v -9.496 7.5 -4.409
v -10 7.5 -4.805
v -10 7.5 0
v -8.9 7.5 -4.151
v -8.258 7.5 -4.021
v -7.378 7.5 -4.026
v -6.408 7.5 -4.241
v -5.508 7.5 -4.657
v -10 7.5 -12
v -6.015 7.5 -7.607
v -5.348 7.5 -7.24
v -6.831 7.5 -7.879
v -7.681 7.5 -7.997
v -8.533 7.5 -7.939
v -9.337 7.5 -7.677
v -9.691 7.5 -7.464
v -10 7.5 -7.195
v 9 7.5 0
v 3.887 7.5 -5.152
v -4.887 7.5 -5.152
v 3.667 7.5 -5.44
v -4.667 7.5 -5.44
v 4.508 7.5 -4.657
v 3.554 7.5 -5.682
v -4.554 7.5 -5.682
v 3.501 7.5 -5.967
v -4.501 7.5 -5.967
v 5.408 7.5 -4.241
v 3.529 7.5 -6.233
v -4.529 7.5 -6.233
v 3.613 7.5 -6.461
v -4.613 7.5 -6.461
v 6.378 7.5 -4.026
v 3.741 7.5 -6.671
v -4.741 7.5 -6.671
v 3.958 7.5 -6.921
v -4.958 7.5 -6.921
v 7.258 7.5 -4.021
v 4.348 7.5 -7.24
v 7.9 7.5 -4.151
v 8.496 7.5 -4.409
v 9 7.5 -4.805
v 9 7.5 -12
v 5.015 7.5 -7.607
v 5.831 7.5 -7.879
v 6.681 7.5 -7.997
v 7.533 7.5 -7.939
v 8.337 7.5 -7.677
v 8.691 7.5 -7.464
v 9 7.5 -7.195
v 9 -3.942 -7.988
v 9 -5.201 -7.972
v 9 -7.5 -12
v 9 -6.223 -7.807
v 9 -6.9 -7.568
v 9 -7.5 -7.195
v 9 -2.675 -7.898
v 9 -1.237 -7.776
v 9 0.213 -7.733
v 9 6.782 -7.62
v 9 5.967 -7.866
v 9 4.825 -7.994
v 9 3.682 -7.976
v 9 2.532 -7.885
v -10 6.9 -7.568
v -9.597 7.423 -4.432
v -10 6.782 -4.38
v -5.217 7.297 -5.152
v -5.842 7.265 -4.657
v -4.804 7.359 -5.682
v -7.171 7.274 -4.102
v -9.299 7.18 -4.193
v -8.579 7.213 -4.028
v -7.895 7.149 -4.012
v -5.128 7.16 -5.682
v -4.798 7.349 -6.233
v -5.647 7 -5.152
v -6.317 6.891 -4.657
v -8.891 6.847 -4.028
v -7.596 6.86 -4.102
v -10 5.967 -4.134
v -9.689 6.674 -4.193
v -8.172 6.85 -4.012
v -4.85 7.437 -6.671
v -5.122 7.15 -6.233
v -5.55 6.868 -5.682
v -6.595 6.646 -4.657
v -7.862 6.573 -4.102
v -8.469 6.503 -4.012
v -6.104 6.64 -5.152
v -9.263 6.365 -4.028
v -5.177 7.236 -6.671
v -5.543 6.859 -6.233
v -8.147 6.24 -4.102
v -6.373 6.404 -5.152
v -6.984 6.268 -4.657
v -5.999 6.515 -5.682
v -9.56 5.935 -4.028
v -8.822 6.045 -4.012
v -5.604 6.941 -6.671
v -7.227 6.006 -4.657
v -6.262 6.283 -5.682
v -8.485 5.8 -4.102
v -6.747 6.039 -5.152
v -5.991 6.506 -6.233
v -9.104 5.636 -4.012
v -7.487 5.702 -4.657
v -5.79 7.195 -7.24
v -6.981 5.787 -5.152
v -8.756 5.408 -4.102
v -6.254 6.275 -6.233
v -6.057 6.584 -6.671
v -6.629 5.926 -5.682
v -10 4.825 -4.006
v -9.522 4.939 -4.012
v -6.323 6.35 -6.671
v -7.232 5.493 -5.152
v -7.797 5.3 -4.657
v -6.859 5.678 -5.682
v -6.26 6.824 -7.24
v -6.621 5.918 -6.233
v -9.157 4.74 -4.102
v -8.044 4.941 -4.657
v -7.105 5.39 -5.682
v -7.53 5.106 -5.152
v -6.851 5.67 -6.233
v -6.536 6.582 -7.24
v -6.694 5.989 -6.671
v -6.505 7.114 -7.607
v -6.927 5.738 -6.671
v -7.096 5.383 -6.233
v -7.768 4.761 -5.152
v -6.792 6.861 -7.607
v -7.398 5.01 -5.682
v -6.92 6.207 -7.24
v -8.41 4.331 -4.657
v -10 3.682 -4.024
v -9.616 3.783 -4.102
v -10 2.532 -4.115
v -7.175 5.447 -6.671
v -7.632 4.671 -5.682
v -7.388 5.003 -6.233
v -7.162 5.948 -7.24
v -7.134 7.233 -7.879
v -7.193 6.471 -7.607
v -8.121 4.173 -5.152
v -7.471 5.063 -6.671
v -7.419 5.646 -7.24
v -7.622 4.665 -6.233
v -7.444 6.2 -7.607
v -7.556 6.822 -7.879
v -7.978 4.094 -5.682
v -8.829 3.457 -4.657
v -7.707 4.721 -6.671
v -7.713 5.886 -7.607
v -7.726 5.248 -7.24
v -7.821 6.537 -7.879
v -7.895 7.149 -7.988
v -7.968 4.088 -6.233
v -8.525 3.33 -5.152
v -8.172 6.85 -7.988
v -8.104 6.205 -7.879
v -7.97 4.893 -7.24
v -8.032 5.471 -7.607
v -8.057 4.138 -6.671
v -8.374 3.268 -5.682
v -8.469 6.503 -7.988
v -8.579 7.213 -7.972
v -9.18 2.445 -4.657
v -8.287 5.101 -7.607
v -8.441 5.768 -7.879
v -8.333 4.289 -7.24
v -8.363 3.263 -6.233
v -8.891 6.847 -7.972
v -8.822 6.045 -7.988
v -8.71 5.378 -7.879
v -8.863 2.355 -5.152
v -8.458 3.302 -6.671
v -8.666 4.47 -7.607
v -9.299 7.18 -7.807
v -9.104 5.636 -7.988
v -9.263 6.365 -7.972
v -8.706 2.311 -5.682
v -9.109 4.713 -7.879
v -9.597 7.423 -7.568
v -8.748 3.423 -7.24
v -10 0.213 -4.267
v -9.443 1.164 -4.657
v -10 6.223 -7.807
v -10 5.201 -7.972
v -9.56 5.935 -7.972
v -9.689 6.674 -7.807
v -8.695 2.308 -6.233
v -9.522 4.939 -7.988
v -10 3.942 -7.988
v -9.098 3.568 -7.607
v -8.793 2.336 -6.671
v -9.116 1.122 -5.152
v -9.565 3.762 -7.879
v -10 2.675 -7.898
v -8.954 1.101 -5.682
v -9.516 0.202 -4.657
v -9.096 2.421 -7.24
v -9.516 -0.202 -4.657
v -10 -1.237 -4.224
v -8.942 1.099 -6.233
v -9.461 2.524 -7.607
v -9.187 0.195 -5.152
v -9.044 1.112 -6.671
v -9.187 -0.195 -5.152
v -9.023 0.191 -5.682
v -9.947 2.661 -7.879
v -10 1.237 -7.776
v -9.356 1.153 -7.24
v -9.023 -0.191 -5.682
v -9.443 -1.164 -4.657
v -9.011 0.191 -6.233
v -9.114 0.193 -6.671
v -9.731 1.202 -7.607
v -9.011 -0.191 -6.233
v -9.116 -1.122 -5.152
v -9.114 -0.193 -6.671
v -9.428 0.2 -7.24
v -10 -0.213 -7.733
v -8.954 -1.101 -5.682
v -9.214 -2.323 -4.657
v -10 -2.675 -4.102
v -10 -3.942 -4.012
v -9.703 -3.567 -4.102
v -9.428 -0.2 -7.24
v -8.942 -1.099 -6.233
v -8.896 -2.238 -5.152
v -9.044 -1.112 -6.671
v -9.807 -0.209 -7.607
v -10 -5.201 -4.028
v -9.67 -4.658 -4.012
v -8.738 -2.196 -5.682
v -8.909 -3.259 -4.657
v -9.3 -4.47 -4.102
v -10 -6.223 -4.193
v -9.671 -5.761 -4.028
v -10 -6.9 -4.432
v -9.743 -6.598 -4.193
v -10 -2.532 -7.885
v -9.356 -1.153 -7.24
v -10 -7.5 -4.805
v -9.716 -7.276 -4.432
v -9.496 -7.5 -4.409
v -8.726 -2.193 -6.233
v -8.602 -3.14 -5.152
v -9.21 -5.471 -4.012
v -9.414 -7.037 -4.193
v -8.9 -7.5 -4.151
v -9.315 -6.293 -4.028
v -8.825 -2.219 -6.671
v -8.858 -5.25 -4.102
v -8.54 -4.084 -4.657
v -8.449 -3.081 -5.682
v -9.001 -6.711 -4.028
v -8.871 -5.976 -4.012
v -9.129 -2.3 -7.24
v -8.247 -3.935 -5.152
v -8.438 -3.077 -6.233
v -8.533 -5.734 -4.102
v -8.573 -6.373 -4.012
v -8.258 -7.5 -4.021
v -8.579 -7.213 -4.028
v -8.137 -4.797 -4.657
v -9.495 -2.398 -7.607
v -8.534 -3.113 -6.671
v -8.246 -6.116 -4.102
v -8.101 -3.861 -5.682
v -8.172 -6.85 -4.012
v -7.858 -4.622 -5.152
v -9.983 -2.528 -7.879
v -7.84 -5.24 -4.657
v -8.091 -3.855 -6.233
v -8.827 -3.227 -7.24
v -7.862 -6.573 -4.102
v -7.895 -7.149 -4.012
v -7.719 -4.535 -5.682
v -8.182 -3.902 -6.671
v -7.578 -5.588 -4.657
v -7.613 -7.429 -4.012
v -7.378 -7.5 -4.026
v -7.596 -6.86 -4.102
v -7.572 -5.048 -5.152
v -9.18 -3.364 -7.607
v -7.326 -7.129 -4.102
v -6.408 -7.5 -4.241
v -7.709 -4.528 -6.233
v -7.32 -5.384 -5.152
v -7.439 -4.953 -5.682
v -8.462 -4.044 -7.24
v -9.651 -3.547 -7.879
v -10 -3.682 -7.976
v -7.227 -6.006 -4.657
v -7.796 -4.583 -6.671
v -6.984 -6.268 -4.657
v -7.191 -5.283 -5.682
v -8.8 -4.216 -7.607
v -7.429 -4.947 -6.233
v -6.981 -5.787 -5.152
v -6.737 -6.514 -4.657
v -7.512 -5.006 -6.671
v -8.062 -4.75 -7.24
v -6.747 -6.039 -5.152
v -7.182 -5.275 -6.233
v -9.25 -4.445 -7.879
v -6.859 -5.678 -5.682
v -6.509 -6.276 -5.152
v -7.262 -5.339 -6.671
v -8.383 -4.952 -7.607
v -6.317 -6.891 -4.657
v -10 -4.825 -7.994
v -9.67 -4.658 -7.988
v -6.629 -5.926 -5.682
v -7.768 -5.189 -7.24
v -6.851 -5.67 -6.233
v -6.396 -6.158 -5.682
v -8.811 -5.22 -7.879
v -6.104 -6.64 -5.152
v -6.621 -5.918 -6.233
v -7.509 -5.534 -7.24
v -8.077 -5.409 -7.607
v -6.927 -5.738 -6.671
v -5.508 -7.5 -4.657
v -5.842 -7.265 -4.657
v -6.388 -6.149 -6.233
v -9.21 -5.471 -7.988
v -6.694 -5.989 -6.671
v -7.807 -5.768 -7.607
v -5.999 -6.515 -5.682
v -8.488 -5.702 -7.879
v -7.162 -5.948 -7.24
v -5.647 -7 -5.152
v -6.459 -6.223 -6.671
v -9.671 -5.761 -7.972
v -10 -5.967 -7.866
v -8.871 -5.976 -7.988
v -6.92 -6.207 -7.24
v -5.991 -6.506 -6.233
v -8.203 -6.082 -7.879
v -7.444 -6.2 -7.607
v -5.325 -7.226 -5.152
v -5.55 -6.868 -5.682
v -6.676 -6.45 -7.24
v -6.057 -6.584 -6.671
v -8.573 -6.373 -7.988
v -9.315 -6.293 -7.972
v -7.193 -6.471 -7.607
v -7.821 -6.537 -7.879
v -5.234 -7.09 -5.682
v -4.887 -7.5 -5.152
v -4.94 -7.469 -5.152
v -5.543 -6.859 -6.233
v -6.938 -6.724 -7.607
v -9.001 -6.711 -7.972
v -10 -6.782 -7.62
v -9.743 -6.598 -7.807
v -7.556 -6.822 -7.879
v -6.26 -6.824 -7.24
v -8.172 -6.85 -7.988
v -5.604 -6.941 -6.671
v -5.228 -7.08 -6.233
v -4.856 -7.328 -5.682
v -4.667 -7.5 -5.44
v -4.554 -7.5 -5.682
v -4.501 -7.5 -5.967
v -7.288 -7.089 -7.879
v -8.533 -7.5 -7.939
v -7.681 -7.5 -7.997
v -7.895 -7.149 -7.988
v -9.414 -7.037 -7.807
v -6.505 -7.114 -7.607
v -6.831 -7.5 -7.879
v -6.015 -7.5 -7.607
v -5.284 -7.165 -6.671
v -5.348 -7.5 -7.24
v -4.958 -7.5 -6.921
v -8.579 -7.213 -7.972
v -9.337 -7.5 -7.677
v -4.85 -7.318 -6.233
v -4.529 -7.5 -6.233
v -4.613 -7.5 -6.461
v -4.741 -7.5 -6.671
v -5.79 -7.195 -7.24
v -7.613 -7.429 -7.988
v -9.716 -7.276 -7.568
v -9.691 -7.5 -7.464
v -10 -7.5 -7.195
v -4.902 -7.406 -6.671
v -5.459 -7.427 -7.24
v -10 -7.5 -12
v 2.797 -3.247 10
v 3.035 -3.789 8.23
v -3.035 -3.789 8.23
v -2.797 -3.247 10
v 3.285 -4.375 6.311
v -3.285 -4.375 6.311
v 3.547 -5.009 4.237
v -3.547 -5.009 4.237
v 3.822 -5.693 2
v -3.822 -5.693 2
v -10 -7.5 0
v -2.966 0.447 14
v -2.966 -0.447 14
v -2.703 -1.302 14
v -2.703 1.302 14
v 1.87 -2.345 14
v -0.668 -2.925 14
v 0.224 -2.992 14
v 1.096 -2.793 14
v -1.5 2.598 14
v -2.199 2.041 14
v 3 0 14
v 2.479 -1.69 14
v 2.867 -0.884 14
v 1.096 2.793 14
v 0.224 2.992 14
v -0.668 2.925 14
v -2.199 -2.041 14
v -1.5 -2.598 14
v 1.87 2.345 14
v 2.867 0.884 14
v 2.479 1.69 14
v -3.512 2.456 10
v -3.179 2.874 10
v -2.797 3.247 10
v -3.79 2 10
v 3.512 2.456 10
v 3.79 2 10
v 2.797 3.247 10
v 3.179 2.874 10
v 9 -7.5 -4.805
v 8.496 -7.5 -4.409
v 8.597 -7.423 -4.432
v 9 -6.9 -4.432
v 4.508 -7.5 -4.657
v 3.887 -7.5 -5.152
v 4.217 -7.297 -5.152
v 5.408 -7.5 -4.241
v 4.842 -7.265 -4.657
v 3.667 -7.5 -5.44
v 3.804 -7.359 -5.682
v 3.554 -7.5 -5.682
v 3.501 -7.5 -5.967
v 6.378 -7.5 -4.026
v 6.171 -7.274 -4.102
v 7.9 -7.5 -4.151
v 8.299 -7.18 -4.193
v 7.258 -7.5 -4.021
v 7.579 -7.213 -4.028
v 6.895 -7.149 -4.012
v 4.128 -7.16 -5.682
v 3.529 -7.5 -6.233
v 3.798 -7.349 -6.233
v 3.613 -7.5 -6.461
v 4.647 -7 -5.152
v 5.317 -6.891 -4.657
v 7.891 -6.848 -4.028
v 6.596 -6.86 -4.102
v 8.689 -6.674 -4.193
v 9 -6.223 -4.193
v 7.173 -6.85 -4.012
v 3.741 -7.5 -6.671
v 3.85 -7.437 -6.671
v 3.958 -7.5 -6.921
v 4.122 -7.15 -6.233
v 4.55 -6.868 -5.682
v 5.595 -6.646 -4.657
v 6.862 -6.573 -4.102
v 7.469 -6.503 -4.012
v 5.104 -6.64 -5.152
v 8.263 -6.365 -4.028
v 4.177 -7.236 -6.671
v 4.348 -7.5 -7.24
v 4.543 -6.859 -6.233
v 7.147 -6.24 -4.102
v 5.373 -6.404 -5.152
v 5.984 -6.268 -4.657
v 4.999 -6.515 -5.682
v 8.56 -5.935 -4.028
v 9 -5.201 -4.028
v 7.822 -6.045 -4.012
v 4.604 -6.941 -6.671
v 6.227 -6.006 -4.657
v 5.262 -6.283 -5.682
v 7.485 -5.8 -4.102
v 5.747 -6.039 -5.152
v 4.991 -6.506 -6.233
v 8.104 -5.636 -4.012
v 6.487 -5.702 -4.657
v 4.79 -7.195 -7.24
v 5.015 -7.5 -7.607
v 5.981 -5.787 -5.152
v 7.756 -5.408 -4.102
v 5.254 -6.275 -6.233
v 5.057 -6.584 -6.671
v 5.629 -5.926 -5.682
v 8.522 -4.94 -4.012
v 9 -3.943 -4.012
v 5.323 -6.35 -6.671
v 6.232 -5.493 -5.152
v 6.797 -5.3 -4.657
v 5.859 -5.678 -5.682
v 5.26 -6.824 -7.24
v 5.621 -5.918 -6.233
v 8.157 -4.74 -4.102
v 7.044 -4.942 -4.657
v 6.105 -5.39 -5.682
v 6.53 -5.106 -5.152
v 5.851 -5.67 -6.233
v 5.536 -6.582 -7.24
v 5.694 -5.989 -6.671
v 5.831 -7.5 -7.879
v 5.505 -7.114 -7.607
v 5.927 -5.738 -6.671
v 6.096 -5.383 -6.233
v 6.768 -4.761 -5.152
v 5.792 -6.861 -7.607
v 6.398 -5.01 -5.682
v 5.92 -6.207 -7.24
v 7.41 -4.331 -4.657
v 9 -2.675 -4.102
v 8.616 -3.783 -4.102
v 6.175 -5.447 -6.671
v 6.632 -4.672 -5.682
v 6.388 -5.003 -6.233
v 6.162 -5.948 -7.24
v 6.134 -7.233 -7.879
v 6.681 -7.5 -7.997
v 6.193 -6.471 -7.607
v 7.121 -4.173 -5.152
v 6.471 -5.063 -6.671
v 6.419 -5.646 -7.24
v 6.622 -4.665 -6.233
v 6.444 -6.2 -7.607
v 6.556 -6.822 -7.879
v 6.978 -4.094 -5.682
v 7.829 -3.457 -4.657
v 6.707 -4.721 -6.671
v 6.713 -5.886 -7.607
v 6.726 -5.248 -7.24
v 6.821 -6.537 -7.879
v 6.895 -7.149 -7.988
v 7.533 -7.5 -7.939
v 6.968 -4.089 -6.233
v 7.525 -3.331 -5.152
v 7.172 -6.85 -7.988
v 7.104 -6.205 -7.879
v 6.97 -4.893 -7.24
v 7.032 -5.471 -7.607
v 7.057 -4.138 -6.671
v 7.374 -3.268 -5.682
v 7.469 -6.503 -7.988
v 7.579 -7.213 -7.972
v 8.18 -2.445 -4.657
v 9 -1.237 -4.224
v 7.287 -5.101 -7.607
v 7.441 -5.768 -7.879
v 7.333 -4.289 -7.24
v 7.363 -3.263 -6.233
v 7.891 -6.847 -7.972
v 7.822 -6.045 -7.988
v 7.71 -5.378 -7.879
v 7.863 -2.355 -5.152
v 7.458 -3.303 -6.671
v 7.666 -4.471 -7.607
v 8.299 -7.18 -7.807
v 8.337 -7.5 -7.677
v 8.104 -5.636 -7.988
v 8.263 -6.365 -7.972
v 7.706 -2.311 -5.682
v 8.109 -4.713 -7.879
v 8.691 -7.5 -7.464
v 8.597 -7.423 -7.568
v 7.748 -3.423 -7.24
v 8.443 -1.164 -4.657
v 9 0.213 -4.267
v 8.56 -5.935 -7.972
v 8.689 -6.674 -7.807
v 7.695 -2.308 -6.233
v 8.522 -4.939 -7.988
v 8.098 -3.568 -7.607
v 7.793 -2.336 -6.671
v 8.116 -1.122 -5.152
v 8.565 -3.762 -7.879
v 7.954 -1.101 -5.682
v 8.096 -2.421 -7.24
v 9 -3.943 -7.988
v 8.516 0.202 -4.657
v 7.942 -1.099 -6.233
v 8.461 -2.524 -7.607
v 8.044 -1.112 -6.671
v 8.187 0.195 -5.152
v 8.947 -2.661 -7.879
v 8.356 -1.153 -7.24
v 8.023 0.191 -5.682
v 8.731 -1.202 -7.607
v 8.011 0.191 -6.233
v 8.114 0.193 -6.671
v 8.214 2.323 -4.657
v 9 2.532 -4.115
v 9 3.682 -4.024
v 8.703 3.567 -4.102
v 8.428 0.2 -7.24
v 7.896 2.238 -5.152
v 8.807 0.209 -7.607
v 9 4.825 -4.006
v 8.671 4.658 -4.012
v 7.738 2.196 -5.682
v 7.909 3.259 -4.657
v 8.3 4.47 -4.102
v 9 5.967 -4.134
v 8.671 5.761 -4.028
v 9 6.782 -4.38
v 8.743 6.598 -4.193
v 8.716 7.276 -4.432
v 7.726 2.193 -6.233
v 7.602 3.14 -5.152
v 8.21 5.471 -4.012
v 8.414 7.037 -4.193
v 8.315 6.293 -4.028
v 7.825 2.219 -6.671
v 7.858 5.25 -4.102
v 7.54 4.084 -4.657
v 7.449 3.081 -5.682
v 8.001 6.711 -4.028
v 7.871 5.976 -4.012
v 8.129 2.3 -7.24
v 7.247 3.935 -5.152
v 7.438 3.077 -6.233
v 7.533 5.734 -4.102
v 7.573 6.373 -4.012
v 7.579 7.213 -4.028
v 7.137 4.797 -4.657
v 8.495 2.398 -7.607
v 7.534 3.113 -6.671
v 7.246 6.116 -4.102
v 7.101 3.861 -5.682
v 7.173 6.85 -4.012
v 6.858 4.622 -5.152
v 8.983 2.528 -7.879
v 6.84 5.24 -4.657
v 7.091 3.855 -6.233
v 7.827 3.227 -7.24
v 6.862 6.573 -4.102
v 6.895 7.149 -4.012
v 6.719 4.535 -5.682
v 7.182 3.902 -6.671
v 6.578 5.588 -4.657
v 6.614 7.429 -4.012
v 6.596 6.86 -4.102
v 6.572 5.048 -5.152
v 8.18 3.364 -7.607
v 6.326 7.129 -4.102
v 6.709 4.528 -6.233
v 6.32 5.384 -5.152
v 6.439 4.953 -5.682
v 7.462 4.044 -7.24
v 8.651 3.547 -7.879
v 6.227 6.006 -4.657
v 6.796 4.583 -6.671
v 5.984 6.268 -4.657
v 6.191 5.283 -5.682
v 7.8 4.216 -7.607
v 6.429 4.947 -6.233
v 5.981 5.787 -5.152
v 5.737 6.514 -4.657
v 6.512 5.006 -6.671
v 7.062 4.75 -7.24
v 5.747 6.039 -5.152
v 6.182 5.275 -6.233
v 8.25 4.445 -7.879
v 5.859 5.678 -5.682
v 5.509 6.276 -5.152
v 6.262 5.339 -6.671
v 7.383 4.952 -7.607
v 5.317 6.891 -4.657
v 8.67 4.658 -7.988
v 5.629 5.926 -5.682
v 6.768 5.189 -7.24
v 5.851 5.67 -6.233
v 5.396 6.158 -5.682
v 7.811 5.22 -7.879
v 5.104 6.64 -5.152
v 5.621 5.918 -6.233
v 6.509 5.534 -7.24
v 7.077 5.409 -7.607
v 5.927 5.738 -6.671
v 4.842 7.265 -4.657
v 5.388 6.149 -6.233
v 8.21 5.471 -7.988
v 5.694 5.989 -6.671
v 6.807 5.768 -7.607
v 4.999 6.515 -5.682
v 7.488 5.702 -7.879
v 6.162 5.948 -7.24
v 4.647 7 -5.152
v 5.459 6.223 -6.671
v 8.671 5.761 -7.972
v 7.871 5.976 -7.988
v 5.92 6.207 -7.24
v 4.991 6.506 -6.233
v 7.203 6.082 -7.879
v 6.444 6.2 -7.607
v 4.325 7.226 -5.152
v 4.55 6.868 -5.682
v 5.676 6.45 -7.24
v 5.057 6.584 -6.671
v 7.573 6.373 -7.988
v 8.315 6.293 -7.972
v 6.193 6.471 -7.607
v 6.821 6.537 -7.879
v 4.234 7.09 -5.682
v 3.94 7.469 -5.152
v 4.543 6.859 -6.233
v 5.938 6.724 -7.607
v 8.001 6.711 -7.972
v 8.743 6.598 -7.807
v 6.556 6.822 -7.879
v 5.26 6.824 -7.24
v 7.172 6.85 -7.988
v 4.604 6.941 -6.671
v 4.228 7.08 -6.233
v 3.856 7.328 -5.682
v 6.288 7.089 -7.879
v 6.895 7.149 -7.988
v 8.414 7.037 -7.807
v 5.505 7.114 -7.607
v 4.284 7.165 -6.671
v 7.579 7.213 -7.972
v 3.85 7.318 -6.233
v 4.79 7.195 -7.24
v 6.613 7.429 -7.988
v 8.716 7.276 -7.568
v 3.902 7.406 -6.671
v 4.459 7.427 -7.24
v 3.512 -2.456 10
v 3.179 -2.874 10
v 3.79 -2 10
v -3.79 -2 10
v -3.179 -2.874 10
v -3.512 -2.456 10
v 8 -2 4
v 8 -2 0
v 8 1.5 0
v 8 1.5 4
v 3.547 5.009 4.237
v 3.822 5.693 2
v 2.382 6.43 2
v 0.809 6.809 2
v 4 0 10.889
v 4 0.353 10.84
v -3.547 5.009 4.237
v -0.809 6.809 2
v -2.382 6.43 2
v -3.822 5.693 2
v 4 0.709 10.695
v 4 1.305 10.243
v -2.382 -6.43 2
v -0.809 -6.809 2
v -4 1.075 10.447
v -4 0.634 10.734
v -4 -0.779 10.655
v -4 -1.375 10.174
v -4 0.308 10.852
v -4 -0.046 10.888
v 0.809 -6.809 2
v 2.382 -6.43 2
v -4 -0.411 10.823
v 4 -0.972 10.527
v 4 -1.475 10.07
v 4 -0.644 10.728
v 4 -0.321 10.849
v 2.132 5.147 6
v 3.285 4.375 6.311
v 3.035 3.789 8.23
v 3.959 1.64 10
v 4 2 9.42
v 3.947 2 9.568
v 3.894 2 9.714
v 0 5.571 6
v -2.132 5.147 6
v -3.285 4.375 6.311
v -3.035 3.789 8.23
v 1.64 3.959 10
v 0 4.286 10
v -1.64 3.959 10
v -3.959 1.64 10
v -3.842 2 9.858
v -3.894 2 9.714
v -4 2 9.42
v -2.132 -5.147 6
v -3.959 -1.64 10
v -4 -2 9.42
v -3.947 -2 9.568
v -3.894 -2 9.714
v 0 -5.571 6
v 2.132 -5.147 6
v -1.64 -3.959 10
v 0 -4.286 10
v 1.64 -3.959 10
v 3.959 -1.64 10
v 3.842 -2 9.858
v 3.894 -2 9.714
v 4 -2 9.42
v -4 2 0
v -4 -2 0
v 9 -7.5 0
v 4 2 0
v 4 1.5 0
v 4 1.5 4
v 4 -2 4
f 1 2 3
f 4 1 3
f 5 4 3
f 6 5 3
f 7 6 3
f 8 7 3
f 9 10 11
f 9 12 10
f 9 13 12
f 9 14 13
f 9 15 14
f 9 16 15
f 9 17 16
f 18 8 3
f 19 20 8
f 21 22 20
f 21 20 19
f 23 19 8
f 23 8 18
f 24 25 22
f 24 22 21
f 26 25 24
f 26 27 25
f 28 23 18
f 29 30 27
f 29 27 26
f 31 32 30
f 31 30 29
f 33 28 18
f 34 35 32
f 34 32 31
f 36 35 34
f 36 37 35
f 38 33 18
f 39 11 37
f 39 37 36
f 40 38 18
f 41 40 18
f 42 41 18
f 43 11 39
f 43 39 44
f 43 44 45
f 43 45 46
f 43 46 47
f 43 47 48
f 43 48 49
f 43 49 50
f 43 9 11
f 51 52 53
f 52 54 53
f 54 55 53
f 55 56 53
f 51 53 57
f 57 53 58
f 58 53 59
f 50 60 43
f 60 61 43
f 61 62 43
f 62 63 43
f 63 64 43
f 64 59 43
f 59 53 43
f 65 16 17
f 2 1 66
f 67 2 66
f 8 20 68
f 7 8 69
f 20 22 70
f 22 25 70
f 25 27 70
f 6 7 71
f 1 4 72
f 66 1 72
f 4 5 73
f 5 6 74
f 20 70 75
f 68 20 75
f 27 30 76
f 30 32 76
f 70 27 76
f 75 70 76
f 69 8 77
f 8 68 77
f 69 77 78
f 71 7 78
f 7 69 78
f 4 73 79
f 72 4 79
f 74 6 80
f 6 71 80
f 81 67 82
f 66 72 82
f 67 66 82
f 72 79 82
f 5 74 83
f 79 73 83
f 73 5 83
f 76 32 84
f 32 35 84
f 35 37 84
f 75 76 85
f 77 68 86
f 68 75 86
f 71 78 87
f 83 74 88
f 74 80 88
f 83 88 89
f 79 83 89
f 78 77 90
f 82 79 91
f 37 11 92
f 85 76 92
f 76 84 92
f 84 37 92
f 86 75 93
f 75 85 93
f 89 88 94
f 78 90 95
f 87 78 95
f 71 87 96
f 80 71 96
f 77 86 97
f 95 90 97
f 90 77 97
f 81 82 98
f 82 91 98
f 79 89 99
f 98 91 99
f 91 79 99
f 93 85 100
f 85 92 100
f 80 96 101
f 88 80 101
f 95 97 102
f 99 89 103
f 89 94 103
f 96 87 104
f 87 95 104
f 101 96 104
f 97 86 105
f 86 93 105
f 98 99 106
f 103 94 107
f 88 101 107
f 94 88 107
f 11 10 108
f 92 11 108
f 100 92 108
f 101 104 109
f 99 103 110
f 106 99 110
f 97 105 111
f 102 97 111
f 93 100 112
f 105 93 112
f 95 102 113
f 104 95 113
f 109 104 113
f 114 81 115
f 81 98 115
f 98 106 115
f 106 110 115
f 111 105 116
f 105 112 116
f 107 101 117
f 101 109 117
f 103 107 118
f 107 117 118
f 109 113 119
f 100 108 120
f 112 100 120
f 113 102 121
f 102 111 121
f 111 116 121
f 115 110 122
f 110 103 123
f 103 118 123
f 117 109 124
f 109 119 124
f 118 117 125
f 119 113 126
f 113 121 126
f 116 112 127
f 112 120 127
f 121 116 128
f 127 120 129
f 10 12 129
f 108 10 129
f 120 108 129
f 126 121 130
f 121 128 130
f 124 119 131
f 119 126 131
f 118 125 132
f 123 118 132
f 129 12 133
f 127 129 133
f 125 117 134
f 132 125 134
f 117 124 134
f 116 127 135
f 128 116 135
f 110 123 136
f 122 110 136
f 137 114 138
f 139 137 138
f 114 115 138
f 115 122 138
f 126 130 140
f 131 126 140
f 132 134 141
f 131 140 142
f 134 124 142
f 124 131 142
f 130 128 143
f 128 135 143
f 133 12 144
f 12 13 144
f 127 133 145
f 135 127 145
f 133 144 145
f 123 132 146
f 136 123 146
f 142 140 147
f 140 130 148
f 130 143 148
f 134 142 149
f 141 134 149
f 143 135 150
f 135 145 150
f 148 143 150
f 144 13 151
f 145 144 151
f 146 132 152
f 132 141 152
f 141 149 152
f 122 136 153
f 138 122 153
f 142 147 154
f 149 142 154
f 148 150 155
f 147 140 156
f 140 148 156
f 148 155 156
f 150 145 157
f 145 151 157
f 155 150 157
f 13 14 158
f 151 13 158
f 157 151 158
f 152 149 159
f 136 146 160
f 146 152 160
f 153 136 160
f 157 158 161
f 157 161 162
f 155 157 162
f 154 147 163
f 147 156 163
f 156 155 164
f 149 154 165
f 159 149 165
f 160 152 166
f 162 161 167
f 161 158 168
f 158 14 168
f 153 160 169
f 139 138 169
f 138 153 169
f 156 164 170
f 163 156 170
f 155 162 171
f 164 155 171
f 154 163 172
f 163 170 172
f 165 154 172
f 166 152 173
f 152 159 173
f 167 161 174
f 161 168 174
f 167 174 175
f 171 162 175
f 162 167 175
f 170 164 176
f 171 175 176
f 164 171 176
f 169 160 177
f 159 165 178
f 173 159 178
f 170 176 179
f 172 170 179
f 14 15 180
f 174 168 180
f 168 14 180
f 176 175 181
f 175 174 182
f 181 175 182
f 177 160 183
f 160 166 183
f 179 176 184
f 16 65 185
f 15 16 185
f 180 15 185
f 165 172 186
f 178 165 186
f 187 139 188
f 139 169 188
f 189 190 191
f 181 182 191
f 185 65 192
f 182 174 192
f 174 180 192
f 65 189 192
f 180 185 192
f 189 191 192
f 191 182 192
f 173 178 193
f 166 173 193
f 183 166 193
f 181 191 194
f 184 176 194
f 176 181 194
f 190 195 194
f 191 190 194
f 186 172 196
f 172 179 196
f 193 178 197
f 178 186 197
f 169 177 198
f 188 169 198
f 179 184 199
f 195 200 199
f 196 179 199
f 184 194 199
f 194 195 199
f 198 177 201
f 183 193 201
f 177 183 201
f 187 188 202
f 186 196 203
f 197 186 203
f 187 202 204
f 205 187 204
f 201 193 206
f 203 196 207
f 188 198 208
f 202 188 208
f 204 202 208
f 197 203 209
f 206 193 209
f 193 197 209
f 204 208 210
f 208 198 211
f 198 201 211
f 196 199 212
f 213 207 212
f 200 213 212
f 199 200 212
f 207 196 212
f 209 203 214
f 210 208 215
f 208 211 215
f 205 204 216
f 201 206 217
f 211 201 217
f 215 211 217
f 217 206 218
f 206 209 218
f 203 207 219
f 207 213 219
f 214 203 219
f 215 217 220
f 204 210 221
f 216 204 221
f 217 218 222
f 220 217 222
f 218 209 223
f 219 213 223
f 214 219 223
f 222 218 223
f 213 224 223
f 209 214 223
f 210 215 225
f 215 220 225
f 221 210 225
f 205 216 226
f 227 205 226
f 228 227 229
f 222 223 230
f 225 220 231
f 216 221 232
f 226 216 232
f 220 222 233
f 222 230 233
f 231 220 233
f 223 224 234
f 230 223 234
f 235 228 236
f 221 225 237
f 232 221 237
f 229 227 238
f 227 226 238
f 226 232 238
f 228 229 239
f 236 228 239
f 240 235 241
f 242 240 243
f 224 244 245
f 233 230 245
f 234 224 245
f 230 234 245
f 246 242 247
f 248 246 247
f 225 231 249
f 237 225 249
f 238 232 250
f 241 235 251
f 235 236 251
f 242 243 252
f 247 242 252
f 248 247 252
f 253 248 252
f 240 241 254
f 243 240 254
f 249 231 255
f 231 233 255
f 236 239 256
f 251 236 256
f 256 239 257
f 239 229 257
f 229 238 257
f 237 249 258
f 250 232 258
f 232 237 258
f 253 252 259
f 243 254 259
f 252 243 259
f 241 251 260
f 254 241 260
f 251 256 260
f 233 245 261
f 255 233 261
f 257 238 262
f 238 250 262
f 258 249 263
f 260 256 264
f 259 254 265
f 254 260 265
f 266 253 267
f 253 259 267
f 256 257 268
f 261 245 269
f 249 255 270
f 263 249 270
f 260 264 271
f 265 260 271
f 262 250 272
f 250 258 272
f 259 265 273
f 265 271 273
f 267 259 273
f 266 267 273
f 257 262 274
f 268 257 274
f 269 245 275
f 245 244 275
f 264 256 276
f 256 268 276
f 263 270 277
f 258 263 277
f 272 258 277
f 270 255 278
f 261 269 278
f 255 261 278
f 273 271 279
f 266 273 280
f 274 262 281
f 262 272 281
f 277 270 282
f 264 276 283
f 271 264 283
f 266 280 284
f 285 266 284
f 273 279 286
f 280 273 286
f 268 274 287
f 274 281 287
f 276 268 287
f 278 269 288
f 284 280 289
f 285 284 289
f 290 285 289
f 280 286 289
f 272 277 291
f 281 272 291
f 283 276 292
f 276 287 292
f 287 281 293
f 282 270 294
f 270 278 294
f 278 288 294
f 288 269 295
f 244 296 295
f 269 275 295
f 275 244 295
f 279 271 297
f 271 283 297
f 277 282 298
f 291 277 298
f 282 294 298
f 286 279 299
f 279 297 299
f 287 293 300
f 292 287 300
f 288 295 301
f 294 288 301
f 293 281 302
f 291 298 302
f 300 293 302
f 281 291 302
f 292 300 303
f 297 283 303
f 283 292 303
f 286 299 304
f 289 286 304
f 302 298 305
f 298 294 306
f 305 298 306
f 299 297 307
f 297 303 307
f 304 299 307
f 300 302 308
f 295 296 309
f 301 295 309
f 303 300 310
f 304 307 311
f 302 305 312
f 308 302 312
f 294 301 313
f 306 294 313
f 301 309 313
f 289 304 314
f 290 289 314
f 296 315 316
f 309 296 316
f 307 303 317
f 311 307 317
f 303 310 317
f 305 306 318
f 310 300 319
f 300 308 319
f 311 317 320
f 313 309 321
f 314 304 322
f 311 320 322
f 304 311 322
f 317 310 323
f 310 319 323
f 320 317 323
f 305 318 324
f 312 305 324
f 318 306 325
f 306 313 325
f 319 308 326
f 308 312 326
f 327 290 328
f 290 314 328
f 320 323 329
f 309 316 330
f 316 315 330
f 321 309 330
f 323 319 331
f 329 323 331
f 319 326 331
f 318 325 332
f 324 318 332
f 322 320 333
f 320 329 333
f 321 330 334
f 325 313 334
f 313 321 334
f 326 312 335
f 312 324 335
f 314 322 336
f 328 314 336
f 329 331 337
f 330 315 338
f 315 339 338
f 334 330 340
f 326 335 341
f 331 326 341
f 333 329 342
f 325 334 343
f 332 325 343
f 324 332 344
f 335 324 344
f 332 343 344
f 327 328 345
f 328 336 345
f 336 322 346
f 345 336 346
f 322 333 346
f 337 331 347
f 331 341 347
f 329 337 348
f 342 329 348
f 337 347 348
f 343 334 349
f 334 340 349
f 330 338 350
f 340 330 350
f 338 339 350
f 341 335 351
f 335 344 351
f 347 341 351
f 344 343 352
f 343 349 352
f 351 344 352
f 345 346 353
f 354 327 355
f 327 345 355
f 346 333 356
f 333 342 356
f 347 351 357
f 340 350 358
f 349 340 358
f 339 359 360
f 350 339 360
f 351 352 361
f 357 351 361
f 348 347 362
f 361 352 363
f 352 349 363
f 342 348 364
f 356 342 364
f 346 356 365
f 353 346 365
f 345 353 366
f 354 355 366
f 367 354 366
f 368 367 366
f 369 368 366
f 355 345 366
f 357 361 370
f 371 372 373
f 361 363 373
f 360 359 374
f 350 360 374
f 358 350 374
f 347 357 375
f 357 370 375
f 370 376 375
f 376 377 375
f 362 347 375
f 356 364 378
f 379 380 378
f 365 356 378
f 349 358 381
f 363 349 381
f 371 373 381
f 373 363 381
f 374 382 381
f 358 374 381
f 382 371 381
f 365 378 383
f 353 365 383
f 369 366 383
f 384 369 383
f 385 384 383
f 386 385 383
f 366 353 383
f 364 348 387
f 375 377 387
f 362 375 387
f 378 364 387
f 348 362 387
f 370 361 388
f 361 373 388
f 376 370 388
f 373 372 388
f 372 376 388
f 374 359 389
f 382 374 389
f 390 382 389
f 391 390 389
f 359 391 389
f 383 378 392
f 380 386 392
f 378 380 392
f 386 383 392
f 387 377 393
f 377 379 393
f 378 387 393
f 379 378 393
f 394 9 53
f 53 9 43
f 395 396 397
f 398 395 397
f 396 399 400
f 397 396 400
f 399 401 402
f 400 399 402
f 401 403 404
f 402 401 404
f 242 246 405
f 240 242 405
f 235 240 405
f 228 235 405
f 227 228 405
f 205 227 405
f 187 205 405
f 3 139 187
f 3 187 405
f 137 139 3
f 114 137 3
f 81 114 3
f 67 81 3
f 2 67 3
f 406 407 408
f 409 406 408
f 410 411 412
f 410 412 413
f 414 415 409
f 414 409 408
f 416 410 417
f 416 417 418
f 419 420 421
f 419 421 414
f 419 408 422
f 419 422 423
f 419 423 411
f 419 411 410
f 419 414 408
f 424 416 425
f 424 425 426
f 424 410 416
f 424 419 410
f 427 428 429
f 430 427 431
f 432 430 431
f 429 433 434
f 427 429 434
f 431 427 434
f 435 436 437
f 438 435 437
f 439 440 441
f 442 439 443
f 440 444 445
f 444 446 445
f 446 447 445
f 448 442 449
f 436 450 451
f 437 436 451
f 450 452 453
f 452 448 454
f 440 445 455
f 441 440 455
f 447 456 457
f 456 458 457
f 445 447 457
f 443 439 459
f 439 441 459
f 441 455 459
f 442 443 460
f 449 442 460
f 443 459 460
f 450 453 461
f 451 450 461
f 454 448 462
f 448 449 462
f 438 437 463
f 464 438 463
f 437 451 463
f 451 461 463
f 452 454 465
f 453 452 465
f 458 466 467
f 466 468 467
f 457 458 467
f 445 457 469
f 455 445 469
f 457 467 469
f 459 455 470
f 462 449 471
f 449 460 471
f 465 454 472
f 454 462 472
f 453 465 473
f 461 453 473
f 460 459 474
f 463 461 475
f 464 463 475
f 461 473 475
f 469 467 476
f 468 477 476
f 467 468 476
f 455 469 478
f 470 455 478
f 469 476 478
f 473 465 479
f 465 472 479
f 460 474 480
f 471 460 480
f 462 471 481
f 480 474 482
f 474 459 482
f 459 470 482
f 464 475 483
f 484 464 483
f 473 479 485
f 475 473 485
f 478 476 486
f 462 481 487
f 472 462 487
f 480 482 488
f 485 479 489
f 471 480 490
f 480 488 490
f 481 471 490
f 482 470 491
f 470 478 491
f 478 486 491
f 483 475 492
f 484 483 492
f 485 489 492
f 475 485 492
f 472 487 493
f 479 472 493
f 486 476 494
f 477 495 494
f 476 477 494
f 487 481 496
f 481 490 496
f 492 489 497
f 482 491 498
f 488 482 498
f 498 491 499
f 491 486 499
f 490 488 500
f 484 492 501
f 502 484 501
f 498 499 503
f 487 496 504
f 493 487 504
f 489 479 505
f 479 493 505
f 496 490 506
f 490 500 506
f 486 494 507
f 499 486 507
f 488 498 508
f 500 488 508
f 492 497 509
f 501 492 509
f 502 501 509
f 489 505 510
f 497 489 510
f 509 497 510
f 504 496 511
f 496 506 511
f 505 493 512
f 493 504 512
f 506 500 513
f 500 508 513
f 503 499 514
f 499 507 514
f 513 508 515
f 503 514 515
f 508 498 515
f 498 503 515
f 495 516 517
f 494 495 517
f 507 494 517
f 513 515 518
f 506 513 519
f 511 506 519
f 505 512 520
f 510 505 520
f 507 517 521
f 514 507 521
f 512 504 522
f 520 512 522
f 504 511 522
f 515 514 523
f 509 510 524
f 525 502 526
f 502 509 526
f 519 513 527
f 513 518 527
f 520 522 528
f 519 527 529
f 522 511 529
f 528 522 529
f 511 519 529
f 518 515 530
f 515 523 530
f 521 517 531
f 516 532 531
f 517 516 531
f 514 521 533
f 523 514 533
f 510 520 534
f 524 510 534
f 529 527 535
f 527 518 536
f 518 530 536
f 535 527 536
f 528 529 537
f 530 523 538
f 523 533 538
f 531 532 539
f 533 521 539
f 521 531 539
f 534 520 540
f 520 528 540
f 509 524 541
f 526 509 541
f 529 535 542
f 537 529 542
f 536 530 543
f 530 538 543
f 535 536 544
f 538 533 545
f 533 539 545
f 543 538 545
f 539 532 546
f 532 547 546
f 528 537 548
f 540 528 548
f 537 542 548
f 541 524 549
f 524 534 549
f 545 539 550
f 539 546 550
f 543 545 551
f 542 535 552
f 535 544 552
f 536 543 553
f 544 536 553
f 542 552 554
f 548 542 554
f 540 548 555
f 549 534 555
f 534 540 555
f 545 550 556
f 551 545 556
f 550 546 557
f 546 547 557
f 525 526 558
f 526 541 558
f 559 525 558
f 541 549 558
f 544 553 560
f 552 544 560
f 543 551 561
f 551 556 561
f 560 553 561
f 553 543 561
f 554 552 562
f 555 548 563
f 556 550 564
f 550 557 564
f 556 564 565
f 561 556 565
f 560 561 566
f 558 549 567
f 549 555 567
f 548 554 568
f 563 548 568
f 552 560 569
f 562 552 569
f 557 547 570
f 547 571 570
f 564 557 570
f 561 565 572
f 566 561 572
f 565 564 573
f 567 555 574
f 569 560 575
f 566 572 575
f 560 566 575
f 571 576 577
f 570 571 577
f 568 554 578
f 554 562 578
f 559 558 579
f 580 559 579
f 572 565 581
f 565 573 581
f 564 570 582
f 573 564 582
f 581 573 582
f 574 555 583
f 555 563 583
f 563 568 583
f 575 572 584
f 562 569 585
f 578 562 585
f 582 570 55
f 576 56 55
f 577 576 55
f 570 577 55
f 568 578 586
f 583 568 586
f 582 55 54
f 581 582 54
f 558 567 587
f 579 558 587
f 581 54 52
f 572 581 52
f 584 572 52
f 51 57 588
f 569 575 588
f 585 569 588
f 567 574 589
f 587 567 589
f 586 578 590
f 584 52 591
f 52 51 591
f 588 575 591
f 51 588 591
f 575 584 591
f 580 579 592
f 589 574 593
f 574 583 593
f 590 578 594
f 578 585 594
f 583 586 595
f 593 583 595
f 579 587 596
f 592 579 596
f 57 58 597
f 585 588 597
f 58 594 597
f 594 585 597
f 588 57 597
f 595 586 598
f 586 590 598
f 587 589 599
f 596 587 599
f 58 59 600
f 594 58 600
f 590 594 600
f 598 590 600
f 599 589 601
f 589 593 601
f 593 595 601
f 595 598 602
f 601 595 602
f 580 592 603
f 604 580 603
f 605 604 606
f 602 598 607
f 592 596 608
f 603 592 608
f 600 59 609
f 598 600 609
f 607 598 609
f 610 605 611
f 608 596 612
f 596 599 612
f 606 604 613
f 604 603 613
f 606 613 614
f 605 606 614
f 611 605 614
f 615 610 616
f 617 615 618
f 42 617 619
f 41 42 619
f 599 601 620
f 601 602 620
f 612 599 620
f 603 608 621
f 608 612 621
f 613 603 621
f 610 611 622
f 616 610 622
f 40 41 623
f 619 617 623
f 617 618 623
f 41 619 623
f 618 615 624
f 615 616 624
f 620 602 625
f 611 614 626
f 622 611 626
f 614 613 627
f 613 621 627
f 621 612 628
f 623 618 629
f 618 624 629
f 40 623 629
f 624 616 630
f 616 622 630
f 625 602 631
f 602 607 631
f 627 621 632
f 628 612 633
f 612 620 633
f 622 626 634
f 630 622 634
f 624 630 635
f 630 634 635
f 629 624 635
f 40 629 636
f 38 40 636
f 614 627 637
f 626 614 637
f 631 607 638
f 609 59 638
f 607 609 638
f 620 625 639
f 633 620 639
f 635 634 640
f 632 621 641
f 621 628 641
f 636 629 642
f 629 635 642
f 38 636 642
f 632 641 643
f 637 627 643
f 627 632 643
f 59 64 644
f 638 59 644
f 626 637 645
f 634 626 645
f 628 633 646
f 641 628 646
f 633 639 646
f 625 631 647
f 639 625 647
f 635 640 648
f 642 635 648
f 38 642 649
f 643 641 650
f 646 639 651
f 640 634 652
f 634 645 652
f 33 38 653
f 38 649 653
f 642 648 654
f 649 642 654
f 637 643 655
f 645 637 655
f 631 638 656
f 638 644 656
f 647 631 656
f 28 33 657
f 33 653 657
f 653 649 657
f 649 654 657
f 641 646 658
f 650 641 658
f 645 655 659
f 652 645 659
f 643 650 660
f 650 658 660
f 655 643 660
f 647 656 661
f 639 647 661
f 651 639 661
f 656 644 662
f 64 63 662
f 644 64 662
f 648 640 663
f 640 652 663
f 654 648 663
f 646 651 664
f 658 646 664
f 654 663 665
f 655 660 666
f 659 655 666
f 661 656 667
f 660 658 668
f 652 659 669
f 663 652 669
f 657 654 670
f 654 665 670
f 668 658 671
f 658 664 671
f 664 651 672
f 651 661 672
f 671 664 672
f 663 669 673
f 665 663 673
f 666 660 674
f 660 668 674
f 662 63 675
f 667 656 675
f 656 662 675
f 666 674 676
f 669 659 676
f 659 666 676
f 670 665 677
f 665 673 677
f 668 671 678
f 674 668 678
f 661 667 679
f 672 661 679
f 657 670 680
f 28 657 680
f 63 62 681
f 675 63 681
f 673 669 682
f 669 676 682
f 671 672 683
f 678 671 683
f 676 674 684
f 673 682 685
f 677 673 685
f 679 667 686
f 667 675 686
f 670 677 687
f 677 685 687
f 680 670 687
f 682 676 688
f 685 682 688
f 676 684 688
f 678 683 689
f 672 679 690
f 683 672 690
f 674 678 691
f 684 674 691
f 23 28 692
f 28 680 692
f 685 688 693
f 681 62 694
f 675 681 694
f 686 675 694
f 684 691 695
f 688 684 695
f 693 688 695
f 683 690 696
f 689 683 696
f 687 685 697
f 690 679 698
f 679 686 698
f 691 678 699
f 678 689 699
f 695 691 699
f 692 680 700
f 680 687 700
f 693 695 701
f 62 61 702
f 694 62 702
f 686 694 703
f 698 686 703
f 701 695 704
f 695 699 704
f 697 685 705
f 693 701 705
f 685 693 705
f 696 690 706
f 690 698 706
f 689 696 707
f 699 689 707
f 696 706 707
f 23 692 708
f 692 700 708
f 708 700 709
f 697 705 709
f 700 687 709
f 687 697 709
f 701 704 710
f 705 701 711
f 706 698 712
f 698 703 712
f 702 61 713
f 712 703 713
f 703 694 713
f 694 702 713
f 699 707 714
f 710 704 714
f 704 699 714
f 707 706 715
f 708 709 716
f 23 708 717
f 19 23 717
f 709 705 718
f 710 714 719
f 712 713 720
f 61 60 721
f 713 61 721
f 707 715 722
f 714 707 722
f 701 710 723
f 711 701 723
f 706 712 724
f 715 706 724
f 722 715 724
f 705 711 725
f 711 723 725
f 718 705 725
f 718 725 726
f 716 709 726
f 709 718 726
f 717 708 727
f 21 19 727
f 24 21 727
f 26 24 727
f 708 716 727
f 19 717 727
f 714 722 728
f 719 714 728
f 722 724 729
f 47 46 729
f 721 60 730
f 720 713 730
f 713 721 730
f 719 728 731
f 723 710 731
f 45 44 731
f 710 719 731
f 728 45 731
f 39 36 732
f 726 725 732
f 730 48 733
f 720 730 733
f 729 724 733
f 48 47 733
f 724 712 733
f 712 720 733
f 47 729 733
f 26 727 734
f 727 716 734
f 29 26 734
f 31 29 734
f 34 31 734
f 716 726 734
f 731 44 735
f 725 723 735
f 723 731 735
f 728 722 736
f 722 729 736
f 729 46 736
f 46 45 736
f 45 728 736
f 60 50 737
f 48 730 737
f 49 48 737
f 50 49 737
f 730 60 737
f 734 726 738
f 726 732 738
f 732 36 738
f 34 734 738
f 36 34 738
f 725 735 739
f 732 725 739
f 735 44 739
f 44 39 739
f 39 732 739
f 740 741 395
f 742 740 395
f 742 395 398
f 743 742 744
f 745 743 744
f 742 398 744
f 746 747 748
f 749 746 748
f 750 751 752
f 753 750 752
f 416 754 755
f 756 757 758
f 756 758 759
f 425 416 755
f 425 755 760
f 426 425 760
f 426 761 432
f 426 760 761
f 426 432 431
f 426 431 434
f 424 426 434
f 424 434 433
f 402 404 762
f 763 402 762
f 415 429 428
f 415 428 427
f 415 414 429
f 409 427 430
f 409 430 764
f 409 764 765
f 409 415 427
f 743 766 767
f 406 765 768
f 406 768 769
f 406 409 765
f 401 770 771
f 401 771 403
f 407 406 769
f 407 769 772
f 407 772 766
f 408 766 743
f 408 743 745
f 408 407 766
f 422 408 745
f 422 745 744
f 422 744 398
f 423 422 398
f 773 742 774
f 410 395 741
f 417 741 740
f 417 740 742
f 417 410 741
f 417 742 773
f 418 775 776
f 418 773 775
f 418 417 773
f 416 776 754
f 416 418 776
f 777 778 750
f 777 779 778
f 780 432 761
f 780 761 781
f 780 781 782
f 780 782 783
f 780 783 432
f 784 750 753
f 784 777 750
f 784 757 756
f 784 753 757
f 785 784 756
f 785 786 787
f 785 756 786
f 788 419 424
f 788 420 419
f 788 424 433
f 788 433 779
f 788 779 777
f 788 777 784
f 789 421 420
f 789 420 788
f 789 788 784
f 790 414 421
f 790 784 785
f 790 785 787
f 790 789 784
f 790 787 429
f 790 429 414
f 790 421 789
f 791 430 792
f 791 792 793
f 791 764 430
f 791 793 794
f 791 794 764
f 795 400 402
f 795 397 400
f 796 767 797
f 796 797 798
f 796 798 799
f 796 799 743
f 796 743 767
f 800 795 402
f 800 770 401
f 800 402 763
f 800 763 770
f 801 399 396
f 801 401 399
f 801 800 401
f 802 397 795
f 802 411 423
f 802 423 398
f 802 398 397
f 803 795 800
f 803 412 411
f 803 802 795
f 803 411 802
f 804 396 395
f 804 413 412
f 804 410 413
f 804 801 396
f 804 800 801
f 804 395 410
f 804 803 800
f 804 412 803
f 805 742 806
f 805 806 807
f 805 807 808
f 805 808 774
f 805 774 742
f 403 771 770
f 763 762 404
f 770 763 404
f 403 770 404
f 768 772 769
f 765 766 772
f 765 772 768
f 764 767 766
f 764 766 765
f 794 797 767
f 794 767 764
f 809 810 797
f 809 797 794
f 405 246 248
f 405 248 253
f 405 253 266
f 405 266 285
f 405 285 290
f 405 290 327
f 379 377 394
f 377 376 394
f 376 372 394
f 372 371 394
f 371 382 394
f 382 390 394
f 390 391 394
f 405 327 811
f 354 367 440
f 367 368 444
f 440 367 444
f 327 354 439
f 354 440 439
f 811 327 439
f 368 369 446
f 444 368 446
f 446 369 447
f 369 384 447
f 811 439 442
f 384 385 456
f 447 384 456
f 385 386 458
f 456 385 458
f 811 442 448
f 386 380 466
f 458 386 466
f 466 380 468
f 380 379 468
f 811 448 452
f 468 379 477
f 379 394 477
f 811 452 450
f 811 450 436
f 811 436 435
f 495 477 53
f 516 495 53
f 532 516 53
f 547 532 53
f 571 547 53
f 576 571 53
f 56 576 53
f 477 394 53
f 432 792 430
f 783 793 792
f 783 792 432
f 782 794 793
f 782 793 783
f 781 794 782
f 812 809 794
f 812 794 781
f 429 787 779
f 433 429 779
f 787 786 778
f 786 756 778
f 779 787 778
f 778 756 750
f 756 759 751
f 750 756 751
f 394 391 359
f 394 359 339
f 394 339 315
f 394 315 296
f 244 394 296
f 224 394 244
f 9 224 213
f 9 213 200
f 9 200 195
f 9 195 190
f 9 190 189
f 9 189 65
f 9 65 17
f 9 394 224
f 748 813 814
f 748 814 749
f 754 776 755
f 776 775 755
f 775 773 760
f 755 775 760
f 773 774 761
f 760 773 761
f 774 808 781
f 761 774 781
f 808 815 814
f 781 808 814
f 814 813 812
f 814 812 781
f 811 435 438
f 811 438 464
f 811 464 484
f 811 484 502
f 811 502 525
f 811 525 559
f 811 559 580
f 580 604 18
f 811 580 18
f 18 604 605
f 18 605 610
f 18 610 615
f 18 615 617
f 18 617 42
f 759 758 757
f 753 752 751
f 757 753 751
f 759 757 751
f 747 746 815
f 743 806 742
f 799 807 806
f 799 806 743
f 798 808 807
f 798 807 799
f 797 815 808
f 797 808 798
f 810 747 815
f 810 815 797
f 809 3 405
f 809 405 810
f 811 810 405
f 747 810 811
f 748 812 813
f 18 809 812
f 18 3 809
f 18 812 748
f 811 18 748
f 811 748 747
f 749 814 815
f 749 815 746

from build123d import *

# Parameters (mm, degrees)
BOX008_W               = 10
BOX008_H               = 10
BOX008_DEPTH           = 5
BOX009_W               = 10
BOX009_H               = 10
BOX009_DEPTH           = 5
BOX006_W               = 10
BOX006_H               = 10
BOX006_DEPTH           = 15
BOX006_PLACEMENT_ANGLE = 90
BOX005_W               = 10
BOX005_H               = 10
BOX005_DEPTH           = 15
BOX002_W               = 20
BOX002_H               = 8
BOX002_DEPTH           = 18
BOX002_ROLL_ANGLE      = 16.999951
BOX003_W               = 20
BOX003_H               = 5
BOX003_DEPTH           = 10
CUT001_PLACEMENT_ANGLE = 180
BOX001_W               = 20
BOX001_H               = 8
BOX001_DEPTH           = 18
BOX001_ROLL_ANGLE      = 16.999951
BOX_W                  = 20
BOX_H                  = 5
BOX_DEPTH              = 10
TORUS_R                = 2
BOX007_W               = 19
BOX007_H               = 15
BOX007_DEPTH           = 12
BOX004_W               = 11
BOX004_H               = 3.5
BOX004_DEPTH           = 4


with BuildPart() as box008:
    # Box008 → Box008 (new body)
    with BuildSketch(Plane(origin=(-5, 5, -3), x_dir=(1, 0, 0), z_dir=(0, 0, 1))):
        with Locations((5, 5)):
            Rectangle(BOX008_W, BOX008_H)
    extrude(amount=BOX008_DEPTH)


with BuildPart() as box009:
    # Box009 → Box009 (new body)
    with BuildSketch(Plane(origin=(5, -4, -3), x_dir=(-1, 0, 0), z_dir=(0, 0, 1))):
        with Locations((5, 5)):
            Rectangle(BOX009_W, BOX009_H)
    extrude(amount=BOX009_DEPTH)


with BuildPart() as box006:
    # Box006 → Box006 (new body)
    with BuildSketch(Plane.XY):
        with Locations((5, 5)):
            Rectangle(BOX006_W, BOX006_H)
    extrude(amount=BOX006_DEPTH)


with BuildPart() as box006_1:
    # Box006 placement: moved
    add(box006.part.moved(Location((-4, -4, 0))).rotate(Axis((-4, -4, 0), (0, 0, 1)), BOX006_PLACEMENT_ANGLE))


with BuildPart() as box005:
    # Box005 → Box005 (new body)
    with BuildSketch(Plane(origin=(4, -4, 0), x_dir=(1, 0, 0), z_dir=(0, 0, 1))):
        with Locations((5, 5)):
            Rectangle(BOX005_W, BOX005_H)
    extrude(amount=BOX005_DEPTH)


with BuildPart() as box002:
    # Box002 → Box002 (new body)
    with BuildSketch(Plane.XY):
        with Locations((10, 4)):
            Rectangle(BOX002_W, BOX002_H)
    extrude(amount=BOX002_DEPTH)


with BuildPart() as box002_1:
    # Box002 roll: moved
    add(box002.part.rotate(Axis((0, 0, 0), (1, 0, 0)), BOX002_ROLL_ANGLE))


with BuildPart() as box002_2:
    # Box002 placement: moved
    add(box002_1.part.moved(Location((0, 17.17, -2.83))))


with BuildPart() as cu_a001:
    # Box003 → Box003 (new body)
    with BuildSketch(Plane(origin=(0, 12, 0), x_dir=(1, 0, 0), z_dir=(0, 0, 1))):
        with Locations((10, 2.5)):
            Rectangle(BOX003_W, BOX003_H)
    extrude(amount=BOX003_DEPTH)

    # Cut001: cut Box002
    add(box002_2.part, mode=Mode.SUBTRACT)


with BuildPart() as cu_a001_1:
    # Cut001 placement: moved
    add(cu_a001.part.moved(Location((10, 10, 0))).rotate(Axis((10, 10, 0), (0, 0, 1)), CUT001_PLACEMENT_ANGLE))


with BuildPart() as box001:
    # Box001 → Box001 (new body)
    with BuildSketch(Plane.XY):
        with Locations((10, 4)):
            Rectangle(BOX001_W, BOX001_H)
    extrude(amount=BOX001_DEPTH)


with BuildPart() as box001_1:
    # Box001 roll: moved
    add(box001.part.rotate(Axis((0, 0, 0), (1, 0, 0)), BOX001_ROLL_ANGLE))


with BuildPart() as box001_2:
    # Box001 placement: moved
    add(box001_1.part.moved(Location((0, 17.17, -2.83))))


with BuildPart() as cu_a:
    # Box → Box (new body)
    with BuildSketch(Plane(origin=(0, 12, 0), x_dir=(1, 0, 0), z_dir=(0, 0, 1))):
        with Locations((10, 2.5)):
            Rectangle(BOX_W, BOX_H)
    extrude(amount=BOX_DEPTH)

    # Cut: cut Box001
    add(box001_2.part, mode=Mode.SUBTRACT)


with BuildPart() as cu_a_1:
    # Cut placement: moved
    add(cu_a.part.moved(Location((-10, -10, 0))))


with BuildPart() as cut007:
    # Cone → Cone (revolve)
    with BuildSketch(Plane.XZ):
        Polygon((0, 0), (7.5, 0), (3, 14), (0, 14), align=None)
    revolve(axis=Axis((0, 0, 0), (0, 0, 1)))

    # Cut002: cut Cuña
    add(cu_a_1.part, mode=Mode.SUBTRACT)

    # Cut003: cut Cuña001
    add(cu_a001_1.part, mode=Mode.SUBTRACT)

    # Cut004: cut Box005
    add(box005.part, mode=Mode.SUBTRACT)

    # Cut005: cut Box006
    add(box006_1.part, mode=Mode.SUBTRACT)

    # Cut006: cut Box009
    add(box009.part, mode=Mode.SUBTRACT)

    # Cut007: cut Box008
    add(box008.part, mode=Mode.SUBTRACT)


with BuildPart() as torus:
    # Torus → Torus (revolve)
    with BuildSketch(Plane(origin=(-0.5, 0, -6), x_dir=(1, 0, 0), z_dir=(0, -1, 0))):
        with Locations((10.5, 0)):
            Circle(TORUS_R)
    revolve(axis=Axis((-0.5, 0, -6), (0, 0, 1)))


with BuildPart() as cut008:
    # Box007 → Box007 (new body)
    with BuildSketch(Plane(origin=(-10, -7.5, -12), x_dir=(1, 0, 0), z_dir=(0, 0, 1))):
        with Locations((9.5, 7.5)):
            Rectangle(BOX007_W, BOX007_H)
    extrude(amount=BOX007_DEPTH)

    # Cut008: cut Torus
    add(torus.part, mode=Mode.SUBTRACT)


with BuildPart() as fusion:
    # Box004 → Box004 (new body)
    with BuildSketch(Plane(origin=(-3, -2, 0), x_dir=(1, 0, 0), z_dir=(0, 0, 1))):
        with Locations((5.5, 1.75)):
            Rectangle(BOX004_W, BOX004_H)
    extrude(amount=BOX004_DEPTH)

    # Fusion: union Cut007, Cut008
    add(cut007.part)
    add(cut008.part)


solid = fusion.part
